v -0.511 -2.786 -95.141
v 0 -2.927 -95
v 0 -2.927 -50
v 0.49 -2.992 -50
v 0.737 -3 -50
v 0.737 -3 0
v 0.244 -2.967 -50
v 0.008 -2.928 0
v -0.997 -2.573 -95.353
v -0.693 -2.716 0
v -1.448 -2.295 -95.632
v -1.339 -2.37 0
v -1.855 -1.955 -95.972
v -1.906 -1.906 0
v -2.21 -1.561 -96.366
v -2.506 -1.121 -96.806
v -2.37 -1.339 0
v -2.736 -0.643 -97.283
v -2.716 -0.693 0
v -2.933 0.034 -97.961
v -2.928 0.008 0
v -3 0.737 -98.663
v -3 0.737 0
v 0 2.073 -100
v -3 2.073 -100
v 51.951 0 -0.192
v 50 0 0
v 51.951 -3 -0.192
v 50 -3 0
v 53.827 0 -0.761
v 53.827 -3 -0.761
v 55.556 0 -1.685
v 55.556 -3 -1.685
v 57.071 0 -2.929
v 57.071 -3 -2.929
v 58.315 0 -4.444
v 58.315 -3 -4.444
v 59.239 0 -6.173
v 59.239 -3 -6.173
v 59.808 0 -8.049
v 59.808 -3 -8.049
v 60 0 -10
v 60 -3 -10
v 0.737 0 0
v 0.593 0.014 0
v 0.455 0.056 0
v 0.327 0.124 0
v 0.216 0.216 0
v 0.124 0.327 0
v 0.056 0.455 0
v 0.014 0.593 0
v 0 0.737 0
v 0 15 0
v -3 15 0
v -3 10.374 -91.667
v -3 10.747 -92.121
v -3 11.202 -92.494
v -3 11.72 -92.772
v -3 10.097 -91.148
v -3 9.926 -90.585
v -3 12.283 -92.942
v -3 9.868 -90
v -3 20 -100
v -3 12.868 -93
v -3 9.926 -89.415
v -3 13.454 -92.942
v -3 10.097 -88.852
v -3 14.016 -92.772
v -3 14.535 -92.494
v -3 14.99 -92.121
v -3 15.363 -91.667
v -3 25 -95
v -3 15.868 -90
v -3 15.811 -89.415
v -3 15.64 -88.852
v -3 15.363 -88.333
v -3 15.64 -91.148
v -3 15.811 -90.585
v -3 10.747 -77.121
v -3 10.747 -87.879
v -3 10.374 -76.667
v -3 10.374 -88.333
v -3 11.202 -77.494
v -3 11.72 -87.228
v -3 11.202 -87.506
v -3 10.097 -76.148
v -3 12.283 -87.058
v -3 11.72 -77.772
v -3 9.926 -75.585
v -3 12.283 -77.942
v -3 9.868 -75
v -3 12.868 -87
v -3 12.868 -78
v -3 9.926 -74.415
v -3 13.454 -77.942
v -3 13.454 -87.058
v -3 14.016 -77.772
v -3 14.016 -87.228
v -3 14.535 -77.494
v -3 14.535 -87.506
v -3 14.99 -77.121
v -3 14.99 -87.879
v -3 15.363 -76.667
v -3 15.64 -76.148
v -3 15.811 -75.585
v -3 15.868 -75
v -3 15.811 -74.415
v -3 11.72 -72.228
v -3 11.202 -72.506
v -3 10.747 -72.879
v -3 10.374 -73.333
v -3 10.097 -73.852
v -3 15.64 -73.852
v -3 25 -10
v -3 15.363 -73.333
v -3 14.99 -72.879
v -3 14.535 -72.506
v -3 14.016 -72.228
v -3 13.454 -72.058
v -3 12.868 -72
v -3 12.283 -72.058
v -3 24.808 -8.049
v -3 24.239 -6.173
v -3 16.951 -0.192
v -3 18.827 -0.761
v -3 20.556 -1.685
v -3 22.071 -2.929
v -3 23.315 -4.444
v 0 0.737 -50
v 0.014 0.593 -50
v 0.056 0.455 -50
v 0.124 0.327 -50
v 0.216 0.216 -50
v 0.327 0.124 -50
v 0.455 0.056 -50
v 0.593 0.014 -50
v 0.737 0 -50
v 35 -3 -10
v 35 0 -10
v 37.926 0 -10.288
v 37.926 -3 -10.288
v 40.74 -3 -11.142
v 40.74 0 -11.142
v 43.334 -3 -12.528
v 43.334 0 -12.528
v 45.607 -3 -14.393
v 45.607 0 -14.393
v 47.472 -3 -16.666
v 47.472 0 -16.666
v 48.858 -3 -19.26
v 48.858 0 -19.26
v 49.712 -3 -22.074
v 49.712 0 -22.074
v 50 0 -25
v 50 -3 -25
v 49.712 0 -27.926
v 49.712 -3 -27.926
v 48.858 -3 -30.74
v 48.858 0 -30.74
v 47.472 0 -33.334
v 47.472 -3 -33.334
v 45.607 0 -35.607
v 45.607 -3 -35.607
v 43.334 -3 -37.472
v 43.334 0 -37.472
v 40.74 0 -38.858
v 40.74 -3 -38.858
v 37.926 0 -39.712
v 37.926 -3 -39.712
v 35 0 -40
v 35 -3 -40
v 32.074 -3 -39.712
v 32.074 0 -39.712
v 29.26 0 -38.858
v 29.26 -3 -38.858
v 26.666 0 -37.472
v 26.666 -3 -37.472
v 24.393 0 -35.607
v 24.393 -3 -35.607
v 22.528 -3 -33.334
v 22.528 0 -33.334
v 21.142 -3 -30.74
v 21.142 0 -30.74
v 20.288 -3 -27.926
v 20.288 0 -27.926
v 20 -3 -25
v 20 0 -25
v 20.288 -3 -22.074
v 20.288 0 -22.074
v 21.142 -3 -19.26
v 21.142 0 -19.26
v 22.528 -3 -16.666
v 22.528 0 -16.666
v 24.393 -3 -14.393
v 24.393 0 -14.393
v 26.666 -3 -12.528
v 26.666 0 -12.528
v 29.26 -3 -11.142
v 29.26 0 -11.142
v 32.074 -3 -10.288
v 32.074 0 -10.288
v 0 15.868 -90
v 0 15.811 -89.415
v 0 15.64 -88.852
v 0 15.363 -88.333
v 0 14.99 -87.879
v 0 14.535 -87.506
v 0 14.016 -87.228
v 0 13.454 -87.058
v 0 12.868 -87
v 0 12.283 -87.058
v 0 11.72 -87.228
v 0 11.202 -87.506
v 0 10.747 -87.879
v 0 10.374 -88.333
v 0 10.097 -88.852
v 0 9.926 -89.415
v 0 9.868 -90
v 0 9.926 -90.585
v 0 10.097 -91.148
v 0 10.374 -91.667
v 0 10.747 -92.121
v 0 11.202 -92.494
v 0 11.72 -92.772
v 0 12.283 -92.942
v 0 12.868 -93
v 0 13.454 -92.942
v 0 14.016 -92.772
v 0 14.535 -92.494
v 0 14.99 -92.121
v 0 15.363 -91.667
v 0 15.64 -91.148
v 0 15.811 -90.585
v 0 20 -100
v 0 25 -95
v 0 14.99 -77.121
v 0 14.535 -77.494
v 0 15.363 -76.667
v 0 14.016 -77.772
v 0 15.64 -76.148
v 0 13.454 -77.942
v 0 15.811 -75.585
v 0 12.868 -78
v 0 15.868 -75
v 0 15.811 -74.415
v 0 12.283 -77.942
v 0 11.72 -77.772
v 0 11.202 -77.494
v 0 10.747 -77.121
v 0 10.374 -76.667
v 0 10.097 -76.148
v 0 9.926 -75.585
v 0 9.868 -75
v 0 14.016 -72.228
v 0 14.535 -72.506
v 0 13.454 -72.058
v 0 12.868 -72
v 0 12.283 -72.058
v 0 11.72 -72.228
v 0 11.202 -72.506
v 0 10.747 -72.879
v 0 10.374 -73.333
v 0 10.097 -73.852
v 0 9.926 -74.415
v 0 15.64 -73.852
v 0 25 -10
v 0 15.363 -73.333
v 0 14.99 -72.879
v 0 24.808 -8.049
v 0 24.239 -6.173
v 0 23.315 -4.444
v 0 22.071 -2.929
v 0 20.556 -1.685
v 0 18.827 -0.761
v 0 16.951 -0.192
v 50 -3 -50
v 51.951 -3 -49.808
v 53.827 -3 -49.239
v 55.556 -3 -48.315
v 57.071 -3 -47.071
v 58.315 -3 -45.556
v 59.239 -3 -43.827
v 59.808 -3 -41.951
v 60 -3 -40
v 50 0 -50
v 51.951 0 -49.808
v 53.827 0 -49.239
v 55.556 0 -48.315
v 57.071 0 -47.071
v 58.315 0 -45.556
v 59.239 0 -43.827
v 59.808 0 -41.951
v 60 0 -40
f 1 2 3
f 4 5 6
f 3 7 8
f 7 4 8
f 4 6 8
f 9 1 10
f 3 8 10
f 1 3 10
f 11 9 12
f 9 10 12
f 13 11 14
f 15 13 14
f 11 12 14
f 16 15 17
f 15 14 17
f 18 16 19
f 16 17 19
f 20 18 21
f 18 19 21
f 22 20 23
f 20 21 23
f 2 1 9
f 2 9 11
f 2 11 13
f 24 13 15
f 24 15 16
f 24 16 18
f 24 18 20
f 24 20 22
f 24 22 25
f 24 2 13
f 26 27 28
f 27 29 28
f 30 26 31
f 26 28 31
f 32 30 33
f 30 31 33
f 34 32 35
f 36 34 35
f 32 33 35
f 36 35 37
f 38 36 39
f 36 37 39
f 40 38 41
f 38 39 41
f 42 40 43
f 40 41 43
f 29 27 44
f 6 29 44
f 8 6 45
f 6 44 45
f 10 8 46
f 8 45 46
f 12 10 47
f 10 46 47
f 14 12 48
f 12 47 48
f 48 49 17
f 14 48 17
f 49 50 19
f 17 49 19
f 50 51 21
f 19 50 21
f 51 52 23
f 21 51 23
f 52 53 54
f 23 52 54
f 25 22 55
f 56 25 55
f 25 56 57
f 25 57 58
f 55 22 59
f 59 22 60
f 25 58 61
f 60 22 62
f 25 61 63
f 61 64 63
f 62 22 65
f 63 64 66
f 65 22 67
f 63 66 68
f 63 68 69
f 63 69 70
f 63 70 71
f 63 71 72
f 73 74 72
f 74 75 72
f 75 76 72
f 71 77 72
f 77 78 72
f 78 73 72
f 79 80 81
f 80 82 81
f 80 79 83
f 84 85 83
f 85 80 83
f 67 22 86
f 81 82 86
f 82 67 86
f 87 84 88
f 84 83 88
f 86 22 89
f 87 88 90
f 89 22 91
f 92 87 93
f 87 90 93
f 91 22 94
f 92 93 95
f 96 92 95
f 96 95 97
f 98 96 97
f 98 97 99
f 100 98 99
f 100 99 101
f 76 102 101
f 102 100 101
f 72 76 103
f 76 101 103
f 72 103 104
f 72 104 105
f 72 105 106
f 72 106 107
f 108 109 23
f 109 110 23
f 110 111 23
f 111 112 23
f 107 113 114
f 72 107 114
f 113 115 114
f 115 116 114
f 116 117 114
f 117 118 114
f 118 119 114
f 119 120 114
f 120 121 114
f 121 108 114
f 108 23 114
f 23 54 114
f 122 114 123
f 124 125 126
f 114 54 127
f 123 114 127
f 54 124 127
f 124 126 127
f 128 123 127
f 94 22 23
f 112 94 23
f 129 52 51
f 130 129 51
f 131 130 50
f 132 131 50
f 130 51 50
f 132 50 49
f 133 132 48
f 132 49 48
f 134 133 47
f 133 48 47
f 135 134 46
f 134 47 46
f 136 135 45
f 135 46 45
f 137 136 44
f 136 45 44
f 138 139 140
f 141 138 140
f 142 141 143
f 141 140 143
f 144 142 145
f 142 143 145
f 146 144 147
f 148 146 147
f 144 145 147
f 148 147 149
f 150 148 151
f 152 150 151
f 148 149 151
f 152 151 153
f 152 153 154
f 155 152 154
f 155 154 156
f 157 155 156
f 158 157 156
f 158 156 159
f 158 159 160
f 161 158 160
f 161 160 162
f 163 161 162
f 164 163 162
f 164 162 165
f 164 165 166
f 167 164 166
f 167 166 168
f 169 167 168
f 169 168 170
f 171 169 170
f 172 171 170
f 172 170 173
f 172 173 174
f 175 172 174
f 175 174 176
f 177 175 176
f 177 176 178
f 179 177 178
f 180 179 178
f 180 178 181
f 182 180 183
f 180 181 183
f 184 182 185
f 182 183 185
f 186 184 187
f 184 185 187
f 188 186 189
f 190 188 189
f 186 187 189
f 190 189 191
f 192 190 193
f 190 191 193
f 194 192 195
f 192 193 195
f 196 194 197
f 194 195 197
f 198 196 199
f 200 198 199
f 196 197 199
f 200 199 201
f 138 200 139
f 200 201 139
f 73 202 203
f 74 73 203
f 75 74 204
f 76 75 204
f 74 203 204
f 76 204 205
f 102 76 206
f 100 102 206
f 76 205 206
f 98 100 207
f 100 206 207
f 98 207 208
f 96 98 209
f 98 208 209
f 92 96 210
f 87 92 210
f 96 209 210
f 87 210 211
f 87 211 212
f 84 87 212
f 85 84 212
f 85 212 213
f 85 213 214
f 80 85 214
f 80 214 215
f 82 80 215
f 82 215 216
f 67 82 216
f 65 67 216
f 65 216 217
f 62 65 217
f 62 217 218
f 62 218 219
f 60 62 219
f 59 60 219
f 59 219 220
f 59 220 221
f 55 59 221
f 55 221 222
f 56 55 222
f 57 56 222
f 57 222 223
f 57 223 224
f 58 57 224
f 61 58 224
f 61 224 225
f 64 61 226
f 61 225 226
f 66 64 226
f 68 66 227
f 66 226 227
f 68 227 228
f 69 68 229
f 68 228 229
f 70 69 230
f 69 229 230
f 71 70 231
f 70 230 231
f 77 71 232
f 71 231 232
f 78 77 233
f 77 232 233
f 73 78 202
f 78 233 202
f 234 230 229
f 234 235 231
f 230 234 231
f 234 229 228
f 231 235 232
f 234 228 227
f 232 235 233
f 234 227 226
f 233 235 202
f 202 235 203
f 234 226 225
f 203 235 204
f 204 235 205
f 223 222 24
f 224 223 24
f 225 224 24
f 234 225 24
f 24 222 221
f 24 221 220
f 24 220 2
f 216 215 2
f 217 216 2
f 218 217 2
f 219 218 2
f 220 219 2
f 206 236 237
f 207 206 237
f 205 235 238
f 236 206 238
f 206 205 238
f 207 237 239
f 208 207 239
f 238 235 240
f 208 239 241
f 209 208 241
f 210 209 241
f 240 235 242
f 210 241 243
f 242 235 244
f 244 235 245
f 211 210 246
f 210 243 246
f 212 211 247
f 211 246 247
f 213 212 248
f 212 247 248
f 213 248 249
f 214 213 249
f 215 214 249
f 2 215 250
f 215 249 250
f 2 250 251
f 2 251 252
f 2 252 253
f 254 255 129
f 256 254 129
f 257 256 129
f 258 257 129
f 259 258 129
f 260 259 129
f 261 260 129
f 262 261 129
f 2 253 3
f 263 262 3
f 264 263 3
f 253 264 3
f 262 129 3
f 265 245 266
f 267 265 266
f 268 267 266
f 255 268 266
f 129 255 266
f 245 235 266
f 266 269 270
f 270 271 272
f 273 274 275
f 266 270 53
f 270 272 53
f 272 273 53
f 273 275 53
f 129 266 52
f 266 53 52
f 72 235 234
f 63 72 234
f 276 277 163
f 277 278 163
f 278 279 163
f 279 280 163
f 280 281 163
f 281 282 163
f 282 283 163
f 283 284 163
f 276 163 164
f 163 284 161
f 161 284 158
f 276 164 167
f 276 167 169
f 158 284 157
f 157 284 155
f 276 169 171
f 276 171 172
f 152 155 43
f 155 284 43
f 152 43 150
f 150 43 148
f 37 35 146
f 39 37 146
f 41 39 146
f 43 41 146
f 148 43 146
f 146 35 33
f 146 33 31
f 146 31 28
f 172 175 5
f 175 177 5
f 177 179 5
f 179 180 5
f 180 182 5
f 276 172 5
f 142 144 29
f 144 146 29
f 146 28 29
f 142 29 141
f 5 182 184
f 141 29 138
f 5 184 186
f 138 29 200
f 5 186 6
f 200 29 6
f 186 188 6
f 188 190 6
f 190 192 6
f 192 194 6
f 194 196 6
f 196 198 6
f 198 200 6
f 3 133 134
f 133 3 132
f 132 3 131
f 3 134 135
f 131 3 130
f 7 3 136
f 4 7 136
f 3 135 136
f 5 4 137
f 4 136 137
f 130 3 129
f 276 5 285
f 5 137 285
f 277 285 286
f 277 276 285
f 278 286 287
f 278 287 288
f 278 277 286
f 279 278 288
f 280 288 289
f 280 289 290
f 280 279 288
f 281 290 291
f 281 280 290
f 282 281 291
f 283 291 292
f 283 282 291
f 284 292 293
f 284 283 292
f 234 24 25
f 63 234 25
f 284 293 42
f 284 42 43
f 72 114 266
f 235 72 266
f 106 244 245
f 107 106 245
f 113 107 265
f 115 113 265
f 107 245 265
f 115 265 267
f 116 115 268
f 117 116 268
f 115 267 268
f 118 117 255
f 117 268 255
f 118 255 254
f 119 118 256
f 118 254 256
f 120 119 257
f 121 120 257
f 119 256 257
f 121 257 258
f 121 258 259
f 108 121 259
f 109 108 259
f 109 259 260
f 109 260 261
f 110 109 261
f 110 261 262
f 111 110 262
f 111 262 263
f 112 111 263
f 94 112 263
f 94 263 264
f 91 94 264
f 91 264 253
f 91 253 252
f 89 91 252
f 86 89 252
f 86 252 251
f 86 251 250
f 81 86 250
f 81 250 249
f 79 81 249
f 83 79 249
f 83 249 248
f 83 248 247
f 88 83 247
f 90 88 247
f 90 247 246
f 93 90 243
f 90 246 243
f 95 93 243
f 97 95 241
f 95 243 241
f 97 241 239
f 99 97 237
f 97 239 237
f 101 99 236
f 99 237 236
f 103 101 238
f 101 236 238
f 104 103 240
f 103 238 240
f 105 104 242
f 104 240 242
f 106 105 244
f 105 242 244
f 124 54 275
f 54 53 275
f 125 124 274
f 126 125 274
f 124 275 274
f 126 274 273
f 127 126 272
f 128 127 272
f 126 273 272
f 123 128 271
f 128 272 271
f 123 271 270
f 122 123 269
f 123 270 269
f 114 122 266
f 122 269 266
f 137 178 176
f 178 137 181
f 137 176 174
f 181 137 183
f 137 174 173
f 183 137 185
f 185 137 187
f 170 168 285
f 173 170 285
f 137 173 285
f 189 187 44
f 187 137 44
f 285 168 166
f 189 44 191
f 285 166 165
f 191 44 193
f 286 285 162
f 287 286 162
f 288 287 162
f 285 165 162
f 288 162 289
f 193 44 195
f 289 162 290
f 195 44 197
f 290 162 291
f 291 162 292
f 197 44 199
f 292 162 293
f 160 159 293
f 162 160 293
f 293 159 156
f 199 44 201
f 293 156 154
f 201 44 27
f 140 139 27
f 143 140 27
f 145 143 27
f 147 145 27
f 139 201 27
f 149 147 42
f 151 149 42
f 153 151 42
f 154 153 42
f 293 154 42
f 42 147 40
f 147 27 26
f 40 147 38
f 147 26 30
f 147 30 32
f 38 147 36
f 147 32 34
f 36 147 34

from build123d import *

# Parameters (mm, degrees)
SM_BASE_FLANGE_1_DEPTH = 100
SKETCH_3_W             = 60
SKETCH_3_H             = 50
CUT_EXTRUDE_1_DEPTH    = 120.933314805
SKETCH_4_R             = 15
CUT_EXTRUDE_2_DEPTH    = 120.268604419
SKETCH_5_R             = 3
CUT_EXTRUDE_3_DEPTH    = 120.268604419
FILLET_1_R             = 10
CUT_EXTRUDE_4_DEPTH    = 120.268604419


# Sheet-metal steps are written as plain solids
with BuildPart() as part:
    # Sketch 1 → 基体-法兰1 (new body)
    with BuildSketch(Plane.XY):
        with BuildLine():
            Line((0, 25), (0, 0.7366))
            ThreePointArc((0, 0.7366), (0.215745145, 0.215745145), (0.7366, 0))
            Line((0.7366, 0), (60, 0))
            Line((60, 0), (60, -3))
            Line((60, -3), (0.7366, -3))
            ThreePointArc((0.7366, -3), (-1.905575199, -1.905575199), (-3, 0.7366))
            Line((-3, 0.7366), (-3, 25))
            Line((-3, 25), (0, 25))
        make_face()
    extrude(amount=-SM_BASE_FLANGE_1_DEPTH)

    # 草图3 → 切除-拉伸1 (cut, through all)
    with BuildSketch(Plane(origin=(0, 25, 0), x_dir=(1, 0, 0), z_dir=(0, 1, 0))):
        with Locations((30, 75)):
            Rectangle(SKETCH_3_W, SKETCH_3_H)
    extrude(amount=-CUT_EXTRUDE_1_DEPTH, mode=Mode.SUBTRACT)

    # 草图4 → 切除-拉伸2 (cut, through all)
    with BuildSketch(Plane(origin=(0, 0, 0), x_dir=(1, 0, 0), z_dir=(0, 1, 0))):
        with Locations(Location((35, 25, 0), (0, 0, 270))):
            Circle(SKETCH_4_R)
    extrude(amount=-CUT_EXTRUDE_2_DEPTH, mode=Mode.SUBTRACT)

    # 草图5 → 切除-拉伸3 (cut, through all)
    with BuildSketch(Plane(origin=(0, 0, 0), x_dir=(0, 0, -1), z_dir=(1, 0, 0))):
        with Locations(Location((75, 12.8683, 0), (0, 0, 90))):
            Circle(SKETCH_5_R)
        with Locations(Location((90, 12.8683, 0), (0, 0, 90))):
            Circle(SKETCH_5_R)
    extrude(amount=-CUT_EXTRUDE_3_DEPTH, mode=Mode.SUBTRACT)

    # 圆角1
    fillet_1_edges = [part.edges().sort_by_distance(p)[0] for p in [
        (60, -1.5, -50),
        (-1.5, 25, 0),
        (60, -1.5, 0),
    ]]
    fillet(fillet_1_edges, radius=FILLET_1_R)

    # 草图6 → 切除-拉伸4 (cut, through all)
    with BuildSketch(Plane(origin=(0, 0, 0), x_dir=(0, 0, -1), z_dir=(1, 0, 0))):
        Polygon((100, 25), (95, 25), (100, 20), align=None)
        Polygon((100, 2.073322779), (100, -2.926677221), (95, -2.926677221), align=None)
    extrude(amount=-CUT_EXTRUDE_4_DEPTH, mode=Mode.SUBTRACT)


solid = part.part
